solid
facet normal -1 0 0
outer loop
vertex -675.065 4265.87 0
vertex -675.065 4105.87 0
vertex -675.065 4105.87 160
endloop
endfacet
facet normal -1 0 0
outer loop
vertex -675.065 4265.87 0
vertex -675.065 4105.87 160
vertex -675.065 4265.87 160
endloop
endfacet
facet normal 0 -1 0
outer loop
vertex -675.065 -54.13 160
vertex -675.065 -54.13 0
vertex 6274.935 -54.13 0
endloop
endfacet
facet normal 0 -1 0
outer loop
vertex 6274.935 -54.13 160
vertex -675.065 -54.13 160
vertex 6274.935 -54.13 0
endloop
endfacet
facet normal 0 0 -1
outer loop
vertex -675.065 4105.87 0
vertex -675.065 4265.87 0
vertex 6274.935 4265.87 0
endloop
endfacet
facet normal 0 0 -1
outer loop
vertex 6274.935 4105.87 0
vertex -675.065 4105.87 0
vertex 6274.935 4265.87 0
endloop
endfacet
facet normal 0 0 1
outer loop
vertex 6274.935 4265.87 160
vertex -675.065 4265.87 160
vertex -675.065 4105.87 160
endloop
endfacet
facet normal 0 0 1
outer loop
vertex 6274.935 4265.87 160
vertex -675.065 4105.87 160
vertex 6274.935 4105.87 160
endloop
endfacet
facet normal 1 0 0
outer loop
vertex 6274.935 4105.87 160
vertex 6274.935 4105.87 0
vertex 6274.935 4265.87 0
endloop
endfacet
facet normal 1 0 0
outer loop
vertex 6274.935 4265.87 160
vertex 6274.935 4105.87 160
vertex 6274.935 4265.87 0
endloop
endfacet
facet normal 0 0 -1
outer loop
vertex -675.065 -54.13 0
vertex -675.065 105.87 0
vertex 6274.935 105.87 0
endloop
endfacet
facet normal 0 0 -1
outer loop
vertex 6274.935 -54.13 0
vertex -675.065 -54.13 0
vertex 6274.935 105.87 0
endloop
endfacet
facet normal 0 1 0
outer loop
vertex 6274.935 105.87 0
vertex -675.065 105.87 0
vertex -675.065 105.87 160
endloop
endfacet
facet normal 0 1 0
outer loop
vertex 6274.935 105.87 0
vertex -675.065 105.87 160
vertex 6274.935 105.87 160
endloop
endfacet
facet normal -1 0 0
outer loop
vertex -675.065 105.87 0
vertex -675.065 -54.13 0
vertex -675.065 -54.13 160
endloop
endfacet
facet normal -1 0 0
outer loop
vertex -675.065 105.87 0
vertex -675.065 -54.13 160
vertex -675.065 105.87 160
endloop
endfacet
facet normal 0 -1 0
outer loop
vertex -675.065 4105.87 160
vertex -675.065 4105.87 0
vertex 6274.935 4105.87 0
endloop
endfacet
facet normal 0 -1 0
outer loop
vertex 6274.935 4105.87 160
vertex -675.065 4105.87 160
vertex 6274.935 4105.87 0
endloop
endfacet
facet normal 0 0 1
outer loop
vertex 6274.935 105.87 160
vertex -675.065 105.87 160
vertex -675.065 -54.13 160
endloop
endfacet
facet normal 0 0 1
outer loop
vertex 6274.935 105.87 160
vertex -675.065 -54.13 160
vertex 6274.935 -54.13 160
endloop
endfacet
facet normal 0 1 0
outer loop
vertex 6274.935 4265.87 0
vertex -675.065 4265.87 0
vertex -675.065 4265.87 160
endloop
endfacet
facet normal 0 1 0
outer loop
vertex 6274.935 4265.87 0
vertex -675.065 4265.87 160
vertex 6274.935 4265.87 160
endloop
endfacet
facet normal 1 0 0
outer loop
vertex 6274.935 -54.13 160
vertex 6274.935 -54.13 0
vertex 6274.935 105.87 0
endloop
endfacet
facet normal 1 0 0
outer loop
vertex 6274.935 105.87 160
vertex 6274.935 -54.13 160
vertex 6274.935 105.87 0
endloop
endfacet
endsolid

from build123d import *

# Parameters (mm, degrees)
F0_W     = 101.0793037713
F0_H     = 4.8006027937
F1_DEPTH = 152.4
F0_H_2   = 4.2672017589
F3_W     = 6950
F3_H     = 160
F4_DEPTH = 160


with BuildPart() as f1:
    # F0 (on Top) → F1 (new body)
    with BuildSketch(Plane.XY):
        with Locations((10.9347011894, 47.7393008769)):
            Rectangle(F0_W, F0_H)
    extrude(amount=F1_DEPTH)


with BuildPart() as f1b:
    # F0 (on Top) → F1, piece 2 (new body)
    with BuildSketch(Plane.XY):
        with Locations((10.9347011894, 13.8684003614)):
            Rectangle(F0_W, F0_H_2)
    extrude(amount=F1_DEPTH)


with BuildPart() as f4:
    # F3 (on Top) → F4 (new body)
    with BuildSketch(Plane.XY):
        with Locations((2799.9345889312, 4185.8699003607)):
            Rectangle(F3_W, F3_H)
    extrude(amount=F4_DEPTH)


with BuildPart() as f4b:
    # F3 (on Top) → F4, piece 2 (new body)
    with BuildSketch(Plane.XY):
        with Locations((2799.9345889312, 25.8699003607)):
            Rectangle(F3_W, F3_H)
    extrude(amount=F4_DEPTH)


solid = Compound([f4.part, f4b.part])
